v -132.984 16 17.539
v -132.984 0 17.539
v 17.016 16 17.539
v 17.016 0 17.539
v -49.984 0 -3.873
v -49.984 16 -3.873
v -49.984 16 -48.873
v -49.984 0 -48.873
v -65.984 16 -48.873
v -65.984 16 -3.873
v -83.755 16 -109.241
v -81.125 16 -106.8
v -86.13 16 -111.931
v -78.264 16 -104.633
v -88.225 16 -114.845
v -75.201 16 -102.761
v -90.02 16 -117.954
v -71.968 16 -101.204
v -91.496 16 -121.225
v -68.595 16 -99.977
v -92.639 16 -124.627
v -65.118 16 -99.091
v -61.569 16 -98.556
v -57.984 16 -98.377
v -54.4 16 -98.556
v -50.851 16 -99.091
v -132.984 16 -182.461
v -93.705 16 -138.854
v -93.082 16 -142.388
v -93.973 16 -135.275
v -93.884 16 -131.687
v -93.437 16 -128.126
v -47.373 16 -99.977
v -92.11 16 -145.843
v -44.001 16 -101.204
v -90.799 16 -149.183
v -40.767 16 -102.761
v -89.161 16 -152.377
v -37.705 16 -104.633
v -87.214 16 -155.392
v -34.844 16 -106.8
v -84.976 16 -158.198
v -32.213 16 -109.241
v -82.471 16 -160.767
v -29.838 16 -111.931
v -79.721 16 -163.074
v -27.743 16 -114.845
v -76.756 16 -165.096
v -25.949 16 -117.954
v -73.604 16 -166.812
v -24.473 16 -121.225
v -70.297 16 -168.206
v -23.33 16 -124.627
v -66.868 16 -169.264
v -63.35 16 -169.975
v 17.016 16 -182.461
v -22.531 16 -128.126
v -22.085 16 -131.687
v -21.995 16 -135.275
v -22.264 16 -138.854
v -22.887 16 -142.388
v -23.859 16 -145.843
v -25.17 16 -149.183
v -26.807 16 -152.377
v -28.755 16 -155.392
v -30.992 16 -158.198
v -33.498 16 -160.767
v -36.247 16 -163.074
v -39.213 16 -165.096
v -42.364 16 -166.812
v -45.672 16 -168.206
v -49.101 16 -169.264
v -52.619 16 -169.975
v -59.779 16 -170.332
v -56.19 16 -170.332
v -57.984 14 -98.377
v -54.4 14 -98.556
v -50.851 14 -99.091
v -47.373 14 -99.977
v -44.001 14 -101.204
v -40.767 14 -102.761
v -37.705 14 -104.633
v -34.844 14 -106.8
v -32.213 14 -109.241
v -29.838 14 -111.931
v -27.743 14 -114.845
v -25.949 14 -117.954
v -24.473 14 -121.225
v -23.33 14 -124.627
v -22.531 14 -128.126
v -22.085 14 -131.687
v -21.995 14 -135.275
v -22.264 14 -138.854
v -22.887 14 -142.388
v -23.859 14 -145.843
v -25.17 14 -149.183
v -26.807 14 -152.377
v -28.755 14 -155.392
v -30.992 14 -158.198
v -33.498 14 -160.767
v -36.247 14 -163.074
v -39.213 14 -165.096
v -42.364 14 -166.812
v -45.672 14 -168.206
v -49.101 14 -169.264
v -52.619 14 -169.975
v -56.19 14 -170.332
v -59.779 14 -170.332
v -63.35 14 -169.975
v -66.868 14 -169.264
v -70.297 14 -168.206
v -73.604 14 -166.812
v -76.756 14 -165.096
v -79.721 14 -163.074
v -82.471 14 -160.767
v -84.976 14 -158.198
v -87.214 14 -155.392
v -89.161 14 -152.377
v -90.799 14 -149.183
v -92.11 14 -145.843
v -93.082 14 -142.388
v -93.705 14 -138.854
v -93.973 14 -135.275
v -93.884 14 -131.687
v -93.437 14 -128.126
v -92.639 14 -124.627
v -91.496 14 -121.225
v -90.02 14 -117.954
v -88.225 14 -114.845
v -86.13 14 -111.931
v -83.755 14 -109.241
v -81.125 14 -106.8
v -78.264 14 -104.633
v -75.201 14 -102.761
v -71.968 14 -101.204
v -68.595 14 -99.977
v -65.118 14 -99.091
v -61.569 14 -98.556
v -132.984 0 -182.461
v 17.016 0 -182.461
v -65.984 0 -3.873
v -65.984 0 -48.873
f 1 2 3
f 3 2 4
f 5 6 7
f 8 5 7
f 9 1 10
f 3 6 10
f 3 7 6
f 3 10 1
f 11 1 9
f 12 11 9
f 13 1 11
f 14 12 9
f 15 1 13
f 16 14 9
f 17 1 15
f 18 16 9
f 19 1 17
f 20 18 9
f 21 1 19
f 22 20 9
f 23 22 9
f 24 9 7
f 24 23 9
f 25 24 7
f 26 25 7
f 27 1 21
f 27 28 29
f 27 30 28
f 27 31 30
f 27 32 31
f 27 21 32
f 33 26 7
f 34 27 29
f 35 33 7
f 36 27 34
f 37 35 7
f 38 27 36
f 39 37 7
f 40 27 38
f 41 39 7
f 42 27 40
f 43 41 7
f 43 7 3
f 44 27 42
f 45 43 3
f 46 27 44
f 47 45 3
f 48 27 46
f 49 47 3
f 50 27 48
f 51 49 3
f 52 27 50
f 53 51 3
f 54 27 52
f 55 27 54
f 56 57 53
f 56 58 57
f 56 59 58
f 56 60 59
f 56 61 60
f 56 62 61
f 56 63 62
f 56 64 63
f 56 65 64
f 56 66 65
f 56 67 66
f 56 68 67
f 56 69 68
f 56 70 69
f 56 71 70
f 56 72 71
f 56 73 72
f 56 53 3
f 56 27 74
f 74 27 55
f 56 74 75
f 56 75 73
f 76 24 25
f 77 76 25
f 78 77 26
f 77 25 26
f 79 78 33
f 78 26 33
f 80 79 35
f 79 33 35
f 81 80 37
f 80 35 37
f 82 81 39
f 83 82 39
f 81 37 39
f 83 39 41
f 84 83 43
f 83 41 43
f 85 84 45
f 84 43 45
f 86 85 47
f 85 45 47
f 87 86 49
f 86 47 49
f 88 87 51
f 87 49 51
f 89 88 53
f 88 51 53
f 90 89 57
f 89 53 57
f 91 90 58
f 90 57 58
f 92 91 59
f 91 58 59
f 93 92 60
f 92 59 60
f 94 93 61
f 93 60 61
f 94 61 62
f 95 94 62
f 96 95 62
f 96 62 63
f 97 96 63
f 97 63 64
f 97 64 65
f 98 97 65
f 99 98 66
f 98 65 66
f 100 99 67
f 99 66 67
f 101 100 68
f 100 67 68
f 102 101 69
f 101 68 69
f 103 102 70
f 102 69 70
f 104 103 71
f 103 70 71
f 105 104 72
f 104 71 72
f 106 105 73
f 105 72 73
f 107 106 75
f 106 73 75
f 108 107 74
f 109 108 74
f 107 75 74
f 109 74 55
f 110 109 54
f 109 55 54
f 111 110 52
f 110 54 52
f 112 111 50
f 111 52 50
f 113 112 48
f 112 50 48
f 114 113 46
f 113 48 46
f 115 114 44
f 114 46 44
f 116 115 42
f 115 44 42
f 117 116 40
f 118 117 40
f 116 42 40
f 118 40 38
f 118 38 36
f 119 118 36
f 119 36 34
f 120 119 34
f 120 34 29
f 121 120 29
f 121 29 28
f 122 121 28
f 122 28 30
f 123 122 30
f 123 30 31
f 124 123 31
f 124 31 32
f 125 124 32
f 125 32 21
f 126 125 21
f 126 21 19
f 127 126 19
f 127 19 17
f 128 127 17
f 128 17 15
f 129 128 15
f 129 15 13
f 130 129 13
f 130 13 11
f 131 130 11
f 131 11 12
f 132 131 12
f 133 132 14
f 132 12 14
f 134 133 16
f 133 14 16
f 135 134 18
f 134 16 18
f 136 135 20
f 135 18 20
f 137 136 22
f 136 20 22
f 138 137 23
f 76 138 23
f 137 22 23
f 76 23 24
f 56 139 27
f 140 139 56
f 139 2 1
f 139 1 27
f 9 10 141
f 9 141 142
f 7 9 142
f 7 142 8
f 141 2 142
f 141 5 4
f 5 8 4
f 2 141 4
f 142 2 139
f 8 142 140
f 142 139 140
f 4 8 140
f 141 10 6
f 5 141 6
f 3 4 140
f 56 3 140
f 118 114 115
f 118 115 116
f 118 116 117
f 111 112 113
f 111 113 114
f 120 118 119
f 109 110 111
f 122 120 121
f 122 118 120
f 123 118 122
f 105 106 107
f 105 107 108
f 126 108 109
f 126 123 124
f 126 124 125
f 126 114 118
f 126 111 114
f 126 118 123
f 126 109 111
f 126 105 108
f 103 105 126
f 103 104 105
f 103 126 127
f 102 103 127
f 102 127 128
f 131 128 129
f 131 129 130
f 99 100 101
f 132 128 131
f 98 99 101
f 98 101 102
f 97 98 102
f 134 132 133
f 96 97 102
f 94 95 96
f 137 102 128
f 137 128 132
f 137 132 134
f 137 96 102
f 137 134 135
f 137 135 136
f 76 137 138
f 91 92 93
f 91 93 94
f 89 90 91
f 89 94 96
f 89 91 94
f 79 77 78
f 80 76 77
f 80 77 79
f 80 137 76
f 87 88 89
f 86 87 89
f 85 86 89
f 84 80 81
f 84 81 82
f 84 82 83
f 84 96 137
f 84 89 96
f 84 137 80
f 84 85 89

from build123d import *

# Parameters (mm, degrees)
IZIM1_W                     = 150
IZIM1_H                     = 200
Y_KSEKLIK_EKSTR_ZYON1_DEPTH = 16
IZIM2_W                     = 16
IZIM2_H                     = 45
KES_EKSTR_ZYON1_DEPTH       = 29
IZIM3_R                     = 36
KES_EKSTR_ZYON3_DEPTH       = 2


with BuildPart() as part:
    # Çizim1 → Yükseklik-Ekstrüzyon1 (new body)
    with BuildSketch(Plane(origin=(0, 0, 0), x_dir=(1, 0, 0), z_dir=(0, 1, 0))):
        with Locations((-57.984293194, 82.460732984)):
            Rectangle(IZIM1_W, IZIM1_H)
    extrude(amount=Y_KSEKLIK_EKSTR_ZYON1_DEPTH)

    # Çizim2 → Kes-Ekstrüzyon1 (cut)
    with BuildSketch(Plane(origin=(0, 16, 0), x_dir=(1, 0, 0), z_dir=(0, 1, 0))):
        with Locations((-57.984293194, 26.373411694)):
            Rectangle(IZIM2_W, IZIM2_H)
    extrude(amount=-KES_EKSTR_ZYON1_DEPTH, mode=Mode.SUBTRACT)

    # Çizim3 → Kes-Ekstrüzyon3 (cut)
    with BuildSketch(Plane(origin=(0, 16, 0), x_dir=(1, 0, 0), z_dir=(0, 1, 0))):
        with Locations(Location((-57.984293194, 134.377130507, 0), (0, 0, 270))):
            Circle(IZIM3_R)
    extrude(amount=-KES_EKSTR_ZYON3_DEPTH, mode=Mode.SUBTRACT)


solid = part.part
